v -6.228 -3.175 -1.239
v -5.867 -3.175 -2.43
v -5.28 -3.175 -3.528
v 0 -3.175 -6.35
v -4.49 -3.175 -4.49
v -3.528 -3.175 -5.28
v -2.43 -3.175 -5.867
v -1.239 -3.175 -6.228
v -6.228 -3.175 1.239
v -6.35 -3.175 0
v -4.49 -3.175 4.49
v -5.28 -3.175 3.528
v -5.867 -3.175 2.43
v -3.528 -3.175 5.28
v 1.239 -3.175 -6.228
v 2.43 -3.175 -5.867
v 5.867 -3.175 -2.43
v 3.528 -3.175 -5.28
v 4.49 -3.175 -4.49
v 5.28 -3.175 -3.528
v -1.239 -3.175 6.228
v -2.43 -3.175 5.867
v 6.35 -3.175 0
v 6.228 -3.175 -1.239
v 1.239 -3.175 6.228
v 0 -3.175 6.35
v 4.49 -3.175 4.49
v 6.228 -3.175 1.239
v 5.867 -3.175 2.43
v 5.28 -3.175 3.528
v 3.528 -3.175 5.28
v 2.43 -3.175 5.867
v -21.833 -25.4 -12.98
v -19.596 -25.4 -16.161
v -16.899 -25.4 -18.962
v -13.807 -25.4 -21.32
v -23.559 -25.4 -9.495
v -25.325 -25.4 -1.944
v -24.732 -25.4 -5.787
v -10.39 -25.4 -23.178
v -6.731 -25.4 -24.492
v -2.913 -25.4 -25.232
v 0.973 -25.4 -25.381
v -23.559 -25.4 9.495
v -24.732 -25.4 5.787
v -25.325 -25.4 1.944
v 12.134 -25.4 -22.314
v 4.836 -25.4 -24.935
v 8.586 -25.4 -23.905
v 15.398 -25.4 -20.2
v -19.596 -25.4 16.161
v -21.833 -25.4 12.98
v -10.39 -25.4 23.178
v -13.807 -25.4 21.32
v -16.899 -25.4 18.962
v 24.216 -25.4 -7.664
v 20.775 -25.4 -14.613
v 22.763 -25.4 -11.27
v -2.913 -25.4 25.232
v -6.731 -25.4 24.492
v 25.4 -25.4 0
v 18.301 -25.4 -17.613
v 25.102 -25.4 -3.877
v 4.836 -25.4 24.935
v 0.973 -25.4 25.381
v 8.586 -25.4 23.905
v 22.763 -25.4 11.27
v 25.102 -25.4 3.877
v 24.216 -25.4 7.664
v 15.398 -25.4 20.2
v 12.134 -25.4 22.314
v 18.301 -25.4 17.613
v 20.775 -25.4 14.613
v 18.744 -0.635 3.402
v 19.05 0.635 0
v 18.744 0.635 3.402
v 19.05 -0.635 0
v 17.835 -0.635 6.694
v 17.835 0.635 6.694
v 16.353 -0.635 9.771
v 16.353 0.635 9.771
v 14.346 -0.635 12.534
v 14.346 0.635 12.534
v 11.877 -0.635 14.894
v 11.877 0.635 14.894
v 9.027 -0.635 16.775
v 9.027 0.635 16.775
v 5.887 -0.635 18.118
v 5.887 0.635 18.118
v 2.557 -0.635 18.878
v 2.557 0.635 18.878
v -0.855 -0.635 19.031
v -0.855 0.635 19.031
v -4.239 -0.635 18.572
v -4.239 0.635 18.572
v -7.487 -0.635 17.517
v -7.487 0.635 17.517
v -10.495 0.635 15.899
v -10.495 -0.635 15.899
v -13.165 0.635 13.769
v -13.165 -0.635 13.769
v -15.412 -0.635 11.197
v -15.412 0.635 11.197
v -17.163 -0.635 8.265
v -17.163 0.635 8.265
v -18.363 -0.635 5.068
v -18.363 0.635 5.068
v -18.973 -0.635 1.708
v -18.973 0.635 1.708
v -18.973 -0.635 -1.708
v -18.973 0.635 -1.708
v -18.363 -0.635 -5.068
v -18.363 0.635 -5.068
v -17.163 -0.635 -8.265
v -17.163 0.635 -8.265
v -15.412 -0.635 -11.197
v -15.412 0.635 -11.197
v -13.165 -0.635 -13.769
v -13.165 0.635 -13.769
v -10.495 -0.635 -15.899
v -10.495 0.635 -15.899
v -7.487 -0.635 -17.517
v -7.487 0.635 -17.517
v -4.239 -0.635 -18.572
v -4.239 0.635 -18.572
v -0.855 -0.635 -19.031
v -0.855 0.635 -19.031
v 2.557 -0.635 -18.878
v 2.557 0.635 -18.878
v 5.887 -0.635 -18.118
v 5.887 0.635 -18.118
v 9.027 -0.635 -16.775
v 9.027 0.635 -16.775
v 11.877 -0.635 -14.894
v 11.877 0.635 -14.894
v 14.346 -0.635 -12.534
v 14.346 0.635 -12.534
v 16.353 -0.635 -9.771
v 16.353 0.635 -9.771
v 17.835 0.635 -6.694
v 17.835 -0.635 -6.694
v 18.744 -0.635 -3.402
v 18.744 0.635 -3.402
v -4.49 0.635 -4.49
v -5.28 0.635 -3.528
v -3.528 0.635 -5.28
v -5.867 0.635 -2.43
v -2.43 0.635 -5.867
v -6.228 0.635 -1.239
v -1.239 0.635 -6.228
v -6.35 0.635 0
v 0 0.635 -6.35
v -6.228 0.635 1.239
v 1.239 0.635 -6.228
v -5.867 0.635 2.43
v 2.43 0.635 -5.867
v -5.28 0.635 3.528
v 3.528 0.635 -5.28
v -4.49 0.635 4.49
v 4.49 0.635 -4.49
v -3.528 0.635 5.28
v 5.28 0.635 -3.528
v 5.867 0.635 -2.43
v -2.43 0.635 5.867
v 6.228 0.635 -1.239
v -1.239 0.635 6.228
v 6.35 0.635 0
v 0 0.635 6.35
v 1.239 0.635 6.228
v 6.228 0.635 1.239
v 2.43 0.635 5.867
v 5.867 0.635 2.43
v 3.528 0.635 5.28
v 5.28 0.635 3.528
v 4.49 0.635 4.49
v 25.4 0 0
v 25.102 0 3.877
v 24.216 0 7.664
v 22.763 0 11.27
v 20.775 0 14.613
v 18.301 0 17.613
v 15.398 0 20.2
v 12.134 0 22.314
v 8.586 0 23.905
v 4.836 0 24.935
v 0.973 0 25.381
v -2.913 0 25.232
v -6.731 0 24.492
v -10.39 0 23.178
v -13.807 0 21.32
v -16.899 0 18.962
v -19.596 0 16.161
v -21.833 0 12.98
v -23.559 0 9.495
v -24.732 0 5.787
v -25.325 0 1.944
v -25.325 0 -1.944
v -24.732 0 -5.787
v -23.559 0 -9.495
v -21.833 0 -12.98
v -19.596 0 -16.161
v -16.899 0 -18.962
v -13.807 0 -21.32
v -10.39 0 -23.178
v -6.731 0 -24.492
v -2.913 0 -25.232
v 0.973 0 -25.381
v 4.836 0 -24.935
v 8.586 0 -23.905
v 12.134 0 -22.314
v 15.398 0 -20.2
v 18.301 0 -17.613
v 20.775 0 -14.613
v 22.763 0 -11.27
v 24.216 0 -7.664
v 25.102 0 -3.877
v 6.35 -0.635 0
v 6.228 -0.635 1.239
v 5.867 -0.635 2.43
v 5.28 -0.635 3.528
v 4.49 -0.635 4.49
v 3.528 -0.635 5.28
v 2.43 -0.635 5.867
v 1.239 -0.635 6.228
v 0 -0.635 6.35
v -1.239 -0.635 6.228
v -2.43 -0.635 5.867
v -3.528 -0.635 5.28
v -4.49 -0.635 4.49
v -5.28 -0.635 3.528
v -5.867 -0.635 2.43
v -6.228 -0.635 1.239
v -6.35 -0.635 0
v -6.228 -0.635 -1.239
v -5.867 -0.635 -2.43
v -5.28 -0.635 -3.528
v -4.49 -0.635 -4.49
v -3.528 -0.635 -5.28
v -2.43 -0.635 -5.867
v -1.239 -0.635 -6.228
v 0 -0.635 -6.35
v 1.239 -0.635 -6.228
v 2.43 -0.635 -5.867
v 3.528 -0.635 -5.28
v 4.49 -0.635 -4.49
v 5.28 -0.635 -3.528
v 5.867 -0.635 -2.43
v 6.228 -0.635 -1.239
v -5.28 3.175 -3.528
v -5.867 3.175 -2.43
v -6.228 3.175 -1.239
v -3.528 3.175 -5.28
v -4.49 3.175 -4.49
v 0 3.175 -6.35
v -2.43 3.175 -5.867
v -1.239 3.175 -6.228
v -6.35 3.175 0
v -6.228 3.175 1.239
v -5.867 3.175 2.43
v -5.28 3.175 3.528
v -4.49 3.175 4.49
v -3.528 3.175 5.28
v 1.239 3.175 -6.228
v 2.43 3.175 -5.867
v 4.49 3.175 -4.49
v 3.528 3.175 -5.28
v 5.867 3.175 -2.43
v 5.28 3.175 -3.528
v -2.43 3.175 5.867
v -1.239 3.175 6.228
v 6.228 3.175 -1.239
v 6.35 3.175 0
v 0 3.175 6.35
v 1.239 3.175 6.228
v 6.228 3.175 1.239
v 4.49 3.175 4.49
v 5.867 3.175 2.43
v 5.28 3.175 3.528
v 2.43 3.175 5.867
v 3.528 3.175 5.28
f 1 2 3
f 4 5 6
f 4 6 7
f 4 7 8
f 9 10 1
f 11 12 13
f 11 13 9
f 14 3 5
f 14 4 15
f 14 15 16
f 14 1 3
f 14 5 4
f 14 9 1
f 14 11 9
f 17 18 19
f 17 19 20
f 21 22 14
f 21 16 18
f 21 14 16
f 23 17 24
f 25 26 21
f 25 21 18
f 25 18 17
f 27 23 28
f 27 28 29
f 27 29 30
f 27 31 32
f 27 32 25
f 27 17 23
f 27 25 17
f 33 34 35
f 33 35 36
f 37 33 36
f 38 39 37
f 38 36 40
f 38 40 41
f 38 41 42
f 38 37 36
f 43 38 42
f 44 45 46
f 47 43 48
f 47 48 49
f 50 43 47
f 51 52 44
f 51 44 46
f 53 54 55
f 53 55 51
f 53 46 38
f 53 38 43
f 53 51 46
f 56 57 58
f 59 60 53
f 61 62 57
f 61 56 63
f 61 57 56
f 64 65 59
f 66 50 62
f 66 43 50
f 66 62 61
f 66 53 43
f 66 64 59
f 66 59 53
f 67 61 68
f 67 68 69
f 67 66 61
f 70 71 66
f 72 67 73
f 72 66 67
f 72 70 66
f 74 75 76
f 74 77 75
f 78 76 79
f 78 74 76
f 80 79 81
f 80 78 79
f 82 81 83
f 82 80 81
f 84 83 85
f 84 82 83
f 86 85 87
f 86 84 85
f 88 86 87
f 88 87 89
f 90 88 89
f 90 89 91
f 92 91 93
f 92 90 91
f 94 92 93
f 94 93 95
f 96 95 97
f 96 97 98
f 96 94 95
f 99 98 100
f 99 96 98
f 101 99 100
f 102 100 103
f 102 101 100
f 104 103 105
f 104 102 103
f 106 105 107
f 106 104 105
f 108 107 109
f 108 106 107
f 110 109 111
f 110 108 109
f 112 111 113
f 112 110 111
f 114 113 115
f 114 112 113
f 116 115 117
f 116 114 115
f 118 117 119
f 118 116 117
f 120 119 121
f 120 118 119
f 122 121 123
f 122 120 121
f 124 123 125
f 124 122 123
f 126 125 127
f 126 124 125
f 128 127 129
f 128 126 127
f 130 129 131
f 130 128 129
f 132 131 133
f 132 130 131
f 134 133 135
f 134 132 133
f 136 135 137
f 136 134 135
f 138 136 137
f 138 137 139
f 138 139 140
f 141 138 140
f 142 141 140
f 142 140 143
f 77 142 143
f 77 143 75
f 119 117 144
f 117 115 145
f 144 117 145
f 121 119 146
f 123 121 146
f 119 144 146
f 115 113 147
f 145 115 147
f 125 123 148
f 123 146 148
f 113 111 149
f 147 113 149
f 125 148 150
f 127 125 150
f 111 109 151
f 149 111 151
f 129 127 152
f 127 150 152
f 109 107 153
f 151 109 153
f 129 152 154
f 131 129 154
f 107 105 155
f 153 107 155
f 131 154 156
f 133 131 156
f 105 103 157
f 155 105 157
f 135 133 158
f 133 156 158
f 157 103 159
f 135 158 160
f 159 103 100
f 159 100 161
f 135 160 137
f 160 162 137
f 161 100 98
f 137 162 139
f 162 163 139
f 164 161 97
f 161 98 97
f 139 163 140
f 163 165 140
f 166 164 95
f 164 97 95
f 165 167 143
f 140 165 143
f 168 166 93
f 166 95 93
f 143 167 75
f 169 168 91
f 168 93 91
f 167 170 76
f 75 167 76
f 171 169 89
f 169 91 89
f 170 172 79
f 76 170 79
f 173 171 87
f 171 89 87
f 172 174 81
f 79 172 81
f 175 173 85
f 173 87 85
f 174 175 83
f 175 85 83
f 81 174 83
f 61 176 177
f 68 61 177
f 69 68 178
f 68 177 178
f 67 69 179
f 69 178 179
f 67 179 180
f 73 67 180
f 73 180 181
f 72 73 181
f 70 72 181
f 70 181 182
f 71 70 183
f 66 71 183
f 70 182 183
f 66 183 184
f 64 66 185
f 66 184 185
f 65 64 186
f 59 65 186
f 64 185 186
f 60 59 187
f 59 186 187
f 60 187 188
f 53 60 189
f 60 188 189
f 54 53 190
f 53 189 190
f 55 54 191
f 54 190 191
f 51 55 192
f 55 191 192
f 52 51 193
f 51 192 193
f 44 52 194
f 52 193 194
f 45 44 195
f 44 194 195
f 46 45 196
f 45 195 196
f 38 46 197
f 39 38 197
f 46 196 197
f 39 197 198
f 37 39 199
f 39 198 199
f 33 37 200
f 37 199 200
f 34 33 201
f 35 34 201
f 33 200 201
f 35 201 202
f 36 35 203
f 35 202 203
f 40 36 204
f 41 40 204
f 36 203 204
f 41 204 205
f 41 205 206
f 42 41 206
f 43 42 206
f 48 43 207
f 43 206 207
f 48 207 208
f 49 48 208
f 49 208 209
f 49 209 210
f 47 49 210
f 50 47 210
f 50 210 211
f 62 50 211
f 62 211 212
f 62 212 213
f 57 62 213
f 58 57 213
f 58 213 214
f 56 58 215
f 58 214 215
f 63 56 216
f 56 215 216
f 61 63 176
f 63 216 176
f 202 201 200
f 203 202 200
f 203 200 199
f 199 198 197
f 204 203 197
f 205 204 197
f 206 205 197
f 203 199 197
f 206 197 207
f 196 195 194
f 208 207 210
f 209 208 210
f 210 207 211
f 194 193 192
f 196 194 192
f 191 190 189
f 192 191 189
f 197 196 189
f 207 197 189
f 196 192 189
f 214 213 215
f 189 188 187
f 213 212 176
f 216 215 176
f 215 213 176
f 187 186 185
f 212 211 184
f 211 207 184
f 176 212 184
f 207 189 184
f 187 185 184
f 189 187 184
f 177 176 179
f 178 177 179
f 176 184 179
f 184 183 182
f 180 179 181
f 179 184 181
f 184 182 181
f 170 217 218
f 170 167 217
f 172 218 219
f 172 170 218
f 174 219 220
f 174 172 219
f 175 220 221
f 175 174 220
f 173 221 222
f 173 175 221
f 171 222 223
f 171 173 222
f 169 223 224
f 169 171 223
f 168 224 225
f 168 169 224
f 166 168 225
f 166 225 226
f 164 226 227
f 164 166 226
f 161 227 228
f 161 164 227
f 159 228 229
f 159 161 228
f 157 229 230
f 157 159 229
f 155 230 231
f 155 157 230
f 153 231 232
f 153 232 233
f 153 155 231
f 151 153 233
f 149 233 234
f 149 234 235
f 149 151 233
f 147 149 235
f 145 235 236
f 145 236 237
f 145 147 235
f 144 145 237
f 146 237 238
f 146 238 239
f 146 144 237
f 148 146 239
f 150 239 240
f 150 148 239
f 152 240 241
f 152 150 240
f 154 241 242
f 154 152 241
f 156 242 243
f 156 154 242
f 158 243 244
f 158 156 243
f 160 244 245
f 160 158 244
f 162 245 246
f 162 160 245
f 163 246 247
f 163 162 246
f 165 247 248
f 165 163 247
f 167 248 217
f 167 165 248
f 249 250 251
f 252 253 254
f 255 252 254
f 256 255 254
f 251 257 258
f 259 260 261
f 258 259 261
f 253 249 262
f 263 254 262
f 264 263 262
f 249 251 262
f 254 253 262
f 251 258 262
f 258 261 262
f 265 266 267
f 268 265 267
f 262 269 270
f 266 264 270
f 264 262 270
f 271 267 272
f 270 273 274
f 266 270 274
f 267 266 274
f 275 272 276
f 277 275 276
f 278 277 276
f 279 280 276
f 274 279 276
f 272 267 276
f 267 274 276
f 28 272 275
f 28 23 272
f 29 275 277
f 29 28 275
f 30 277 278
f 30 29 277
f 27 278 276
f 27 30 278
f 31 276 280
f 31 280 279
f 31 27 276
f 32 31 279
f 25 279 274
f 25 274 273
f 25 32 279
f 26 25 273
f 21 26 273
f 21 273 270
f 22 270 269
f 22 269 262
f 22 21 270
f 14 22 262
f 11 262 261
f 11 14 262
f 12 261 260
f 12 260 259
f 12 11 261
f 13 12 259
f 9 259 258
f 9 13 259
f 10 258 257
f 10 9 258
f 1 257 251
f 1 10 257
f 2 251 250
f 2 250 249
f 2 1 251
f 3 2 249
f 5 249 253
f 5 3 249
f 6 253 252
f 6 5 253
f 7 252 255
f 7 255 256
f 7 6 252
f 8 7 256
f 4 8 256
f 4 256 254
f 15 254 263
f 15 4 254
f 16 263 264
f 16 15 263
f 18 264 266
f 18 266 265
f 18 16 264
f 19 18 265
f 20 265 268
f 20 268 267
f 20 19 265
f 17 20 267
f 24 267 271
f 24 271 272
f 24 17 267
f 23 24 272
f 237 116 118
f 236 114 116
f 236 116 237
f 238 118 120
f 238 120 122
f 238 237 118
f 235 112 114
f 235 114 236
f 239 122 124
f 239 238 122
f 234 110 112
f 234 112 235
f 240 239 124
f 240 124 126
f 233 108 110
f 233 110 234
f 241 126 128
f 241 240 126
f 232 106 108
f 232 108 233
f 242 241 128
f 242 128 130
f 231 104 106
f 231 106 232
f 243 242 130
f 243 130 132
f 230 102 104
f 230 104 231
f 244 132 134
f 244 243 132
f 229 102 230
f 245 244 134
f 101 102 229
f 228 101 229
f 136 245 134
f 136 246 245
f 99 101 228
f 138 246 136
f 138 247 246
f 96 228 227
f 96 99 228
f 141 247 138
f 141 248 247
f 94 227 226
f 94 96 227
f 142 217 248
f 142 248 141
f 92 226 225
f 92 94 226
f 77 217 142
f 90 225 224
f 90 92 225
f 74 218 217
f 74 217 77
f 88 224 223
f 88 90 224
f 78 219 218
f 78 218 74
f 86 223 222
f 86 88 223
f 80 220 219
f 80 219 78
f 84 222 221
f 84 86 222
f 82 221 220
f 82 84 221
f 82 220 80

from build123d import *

# Parameters (mm, degrees)
F0_R     = 25.4
F0_R_2   = 19.05
F0_R_3   = 6.35
F1_DEPTH = 25.4
F2_DEPTH = 0.635
F3_DEPTH = 3.175


with BuildPart() as f1:
    # F0 (on Front) → F1 (new body)
    with BuildSketch(Plane.XZ):
        Circle(F0_R)
        Circle(F0_R_2, mode=Mode.SUBTRACT)
        Circle(F0_R_2)
        Circle(F0_R_3, mode=Mode.SUBTRACT)
        Circle(F0_R_3)
    extrude(amount=F1_DEPTH)


with BuildPart() as f2:
    # F0 (on Front) → F2 (new body, symmetric)
    with BuildSketch(Plane.XZ):
        Circle(F0_R_2)
        Circle(F0_R_3, mode=Mode.SUBTRACT)
    extrude(amount=F2_DEPTH, both=True)


with BuildPart() as f3:
    # F0 (on Front) → F3 (new body, symmetric)
    with BuildSketch(Plane.XZ):
        Circle(F0_R_3)
    extrude(amount=F3_DEPTH, both=True)


solid = Compound([f1.part, f2.part, f3.part])
